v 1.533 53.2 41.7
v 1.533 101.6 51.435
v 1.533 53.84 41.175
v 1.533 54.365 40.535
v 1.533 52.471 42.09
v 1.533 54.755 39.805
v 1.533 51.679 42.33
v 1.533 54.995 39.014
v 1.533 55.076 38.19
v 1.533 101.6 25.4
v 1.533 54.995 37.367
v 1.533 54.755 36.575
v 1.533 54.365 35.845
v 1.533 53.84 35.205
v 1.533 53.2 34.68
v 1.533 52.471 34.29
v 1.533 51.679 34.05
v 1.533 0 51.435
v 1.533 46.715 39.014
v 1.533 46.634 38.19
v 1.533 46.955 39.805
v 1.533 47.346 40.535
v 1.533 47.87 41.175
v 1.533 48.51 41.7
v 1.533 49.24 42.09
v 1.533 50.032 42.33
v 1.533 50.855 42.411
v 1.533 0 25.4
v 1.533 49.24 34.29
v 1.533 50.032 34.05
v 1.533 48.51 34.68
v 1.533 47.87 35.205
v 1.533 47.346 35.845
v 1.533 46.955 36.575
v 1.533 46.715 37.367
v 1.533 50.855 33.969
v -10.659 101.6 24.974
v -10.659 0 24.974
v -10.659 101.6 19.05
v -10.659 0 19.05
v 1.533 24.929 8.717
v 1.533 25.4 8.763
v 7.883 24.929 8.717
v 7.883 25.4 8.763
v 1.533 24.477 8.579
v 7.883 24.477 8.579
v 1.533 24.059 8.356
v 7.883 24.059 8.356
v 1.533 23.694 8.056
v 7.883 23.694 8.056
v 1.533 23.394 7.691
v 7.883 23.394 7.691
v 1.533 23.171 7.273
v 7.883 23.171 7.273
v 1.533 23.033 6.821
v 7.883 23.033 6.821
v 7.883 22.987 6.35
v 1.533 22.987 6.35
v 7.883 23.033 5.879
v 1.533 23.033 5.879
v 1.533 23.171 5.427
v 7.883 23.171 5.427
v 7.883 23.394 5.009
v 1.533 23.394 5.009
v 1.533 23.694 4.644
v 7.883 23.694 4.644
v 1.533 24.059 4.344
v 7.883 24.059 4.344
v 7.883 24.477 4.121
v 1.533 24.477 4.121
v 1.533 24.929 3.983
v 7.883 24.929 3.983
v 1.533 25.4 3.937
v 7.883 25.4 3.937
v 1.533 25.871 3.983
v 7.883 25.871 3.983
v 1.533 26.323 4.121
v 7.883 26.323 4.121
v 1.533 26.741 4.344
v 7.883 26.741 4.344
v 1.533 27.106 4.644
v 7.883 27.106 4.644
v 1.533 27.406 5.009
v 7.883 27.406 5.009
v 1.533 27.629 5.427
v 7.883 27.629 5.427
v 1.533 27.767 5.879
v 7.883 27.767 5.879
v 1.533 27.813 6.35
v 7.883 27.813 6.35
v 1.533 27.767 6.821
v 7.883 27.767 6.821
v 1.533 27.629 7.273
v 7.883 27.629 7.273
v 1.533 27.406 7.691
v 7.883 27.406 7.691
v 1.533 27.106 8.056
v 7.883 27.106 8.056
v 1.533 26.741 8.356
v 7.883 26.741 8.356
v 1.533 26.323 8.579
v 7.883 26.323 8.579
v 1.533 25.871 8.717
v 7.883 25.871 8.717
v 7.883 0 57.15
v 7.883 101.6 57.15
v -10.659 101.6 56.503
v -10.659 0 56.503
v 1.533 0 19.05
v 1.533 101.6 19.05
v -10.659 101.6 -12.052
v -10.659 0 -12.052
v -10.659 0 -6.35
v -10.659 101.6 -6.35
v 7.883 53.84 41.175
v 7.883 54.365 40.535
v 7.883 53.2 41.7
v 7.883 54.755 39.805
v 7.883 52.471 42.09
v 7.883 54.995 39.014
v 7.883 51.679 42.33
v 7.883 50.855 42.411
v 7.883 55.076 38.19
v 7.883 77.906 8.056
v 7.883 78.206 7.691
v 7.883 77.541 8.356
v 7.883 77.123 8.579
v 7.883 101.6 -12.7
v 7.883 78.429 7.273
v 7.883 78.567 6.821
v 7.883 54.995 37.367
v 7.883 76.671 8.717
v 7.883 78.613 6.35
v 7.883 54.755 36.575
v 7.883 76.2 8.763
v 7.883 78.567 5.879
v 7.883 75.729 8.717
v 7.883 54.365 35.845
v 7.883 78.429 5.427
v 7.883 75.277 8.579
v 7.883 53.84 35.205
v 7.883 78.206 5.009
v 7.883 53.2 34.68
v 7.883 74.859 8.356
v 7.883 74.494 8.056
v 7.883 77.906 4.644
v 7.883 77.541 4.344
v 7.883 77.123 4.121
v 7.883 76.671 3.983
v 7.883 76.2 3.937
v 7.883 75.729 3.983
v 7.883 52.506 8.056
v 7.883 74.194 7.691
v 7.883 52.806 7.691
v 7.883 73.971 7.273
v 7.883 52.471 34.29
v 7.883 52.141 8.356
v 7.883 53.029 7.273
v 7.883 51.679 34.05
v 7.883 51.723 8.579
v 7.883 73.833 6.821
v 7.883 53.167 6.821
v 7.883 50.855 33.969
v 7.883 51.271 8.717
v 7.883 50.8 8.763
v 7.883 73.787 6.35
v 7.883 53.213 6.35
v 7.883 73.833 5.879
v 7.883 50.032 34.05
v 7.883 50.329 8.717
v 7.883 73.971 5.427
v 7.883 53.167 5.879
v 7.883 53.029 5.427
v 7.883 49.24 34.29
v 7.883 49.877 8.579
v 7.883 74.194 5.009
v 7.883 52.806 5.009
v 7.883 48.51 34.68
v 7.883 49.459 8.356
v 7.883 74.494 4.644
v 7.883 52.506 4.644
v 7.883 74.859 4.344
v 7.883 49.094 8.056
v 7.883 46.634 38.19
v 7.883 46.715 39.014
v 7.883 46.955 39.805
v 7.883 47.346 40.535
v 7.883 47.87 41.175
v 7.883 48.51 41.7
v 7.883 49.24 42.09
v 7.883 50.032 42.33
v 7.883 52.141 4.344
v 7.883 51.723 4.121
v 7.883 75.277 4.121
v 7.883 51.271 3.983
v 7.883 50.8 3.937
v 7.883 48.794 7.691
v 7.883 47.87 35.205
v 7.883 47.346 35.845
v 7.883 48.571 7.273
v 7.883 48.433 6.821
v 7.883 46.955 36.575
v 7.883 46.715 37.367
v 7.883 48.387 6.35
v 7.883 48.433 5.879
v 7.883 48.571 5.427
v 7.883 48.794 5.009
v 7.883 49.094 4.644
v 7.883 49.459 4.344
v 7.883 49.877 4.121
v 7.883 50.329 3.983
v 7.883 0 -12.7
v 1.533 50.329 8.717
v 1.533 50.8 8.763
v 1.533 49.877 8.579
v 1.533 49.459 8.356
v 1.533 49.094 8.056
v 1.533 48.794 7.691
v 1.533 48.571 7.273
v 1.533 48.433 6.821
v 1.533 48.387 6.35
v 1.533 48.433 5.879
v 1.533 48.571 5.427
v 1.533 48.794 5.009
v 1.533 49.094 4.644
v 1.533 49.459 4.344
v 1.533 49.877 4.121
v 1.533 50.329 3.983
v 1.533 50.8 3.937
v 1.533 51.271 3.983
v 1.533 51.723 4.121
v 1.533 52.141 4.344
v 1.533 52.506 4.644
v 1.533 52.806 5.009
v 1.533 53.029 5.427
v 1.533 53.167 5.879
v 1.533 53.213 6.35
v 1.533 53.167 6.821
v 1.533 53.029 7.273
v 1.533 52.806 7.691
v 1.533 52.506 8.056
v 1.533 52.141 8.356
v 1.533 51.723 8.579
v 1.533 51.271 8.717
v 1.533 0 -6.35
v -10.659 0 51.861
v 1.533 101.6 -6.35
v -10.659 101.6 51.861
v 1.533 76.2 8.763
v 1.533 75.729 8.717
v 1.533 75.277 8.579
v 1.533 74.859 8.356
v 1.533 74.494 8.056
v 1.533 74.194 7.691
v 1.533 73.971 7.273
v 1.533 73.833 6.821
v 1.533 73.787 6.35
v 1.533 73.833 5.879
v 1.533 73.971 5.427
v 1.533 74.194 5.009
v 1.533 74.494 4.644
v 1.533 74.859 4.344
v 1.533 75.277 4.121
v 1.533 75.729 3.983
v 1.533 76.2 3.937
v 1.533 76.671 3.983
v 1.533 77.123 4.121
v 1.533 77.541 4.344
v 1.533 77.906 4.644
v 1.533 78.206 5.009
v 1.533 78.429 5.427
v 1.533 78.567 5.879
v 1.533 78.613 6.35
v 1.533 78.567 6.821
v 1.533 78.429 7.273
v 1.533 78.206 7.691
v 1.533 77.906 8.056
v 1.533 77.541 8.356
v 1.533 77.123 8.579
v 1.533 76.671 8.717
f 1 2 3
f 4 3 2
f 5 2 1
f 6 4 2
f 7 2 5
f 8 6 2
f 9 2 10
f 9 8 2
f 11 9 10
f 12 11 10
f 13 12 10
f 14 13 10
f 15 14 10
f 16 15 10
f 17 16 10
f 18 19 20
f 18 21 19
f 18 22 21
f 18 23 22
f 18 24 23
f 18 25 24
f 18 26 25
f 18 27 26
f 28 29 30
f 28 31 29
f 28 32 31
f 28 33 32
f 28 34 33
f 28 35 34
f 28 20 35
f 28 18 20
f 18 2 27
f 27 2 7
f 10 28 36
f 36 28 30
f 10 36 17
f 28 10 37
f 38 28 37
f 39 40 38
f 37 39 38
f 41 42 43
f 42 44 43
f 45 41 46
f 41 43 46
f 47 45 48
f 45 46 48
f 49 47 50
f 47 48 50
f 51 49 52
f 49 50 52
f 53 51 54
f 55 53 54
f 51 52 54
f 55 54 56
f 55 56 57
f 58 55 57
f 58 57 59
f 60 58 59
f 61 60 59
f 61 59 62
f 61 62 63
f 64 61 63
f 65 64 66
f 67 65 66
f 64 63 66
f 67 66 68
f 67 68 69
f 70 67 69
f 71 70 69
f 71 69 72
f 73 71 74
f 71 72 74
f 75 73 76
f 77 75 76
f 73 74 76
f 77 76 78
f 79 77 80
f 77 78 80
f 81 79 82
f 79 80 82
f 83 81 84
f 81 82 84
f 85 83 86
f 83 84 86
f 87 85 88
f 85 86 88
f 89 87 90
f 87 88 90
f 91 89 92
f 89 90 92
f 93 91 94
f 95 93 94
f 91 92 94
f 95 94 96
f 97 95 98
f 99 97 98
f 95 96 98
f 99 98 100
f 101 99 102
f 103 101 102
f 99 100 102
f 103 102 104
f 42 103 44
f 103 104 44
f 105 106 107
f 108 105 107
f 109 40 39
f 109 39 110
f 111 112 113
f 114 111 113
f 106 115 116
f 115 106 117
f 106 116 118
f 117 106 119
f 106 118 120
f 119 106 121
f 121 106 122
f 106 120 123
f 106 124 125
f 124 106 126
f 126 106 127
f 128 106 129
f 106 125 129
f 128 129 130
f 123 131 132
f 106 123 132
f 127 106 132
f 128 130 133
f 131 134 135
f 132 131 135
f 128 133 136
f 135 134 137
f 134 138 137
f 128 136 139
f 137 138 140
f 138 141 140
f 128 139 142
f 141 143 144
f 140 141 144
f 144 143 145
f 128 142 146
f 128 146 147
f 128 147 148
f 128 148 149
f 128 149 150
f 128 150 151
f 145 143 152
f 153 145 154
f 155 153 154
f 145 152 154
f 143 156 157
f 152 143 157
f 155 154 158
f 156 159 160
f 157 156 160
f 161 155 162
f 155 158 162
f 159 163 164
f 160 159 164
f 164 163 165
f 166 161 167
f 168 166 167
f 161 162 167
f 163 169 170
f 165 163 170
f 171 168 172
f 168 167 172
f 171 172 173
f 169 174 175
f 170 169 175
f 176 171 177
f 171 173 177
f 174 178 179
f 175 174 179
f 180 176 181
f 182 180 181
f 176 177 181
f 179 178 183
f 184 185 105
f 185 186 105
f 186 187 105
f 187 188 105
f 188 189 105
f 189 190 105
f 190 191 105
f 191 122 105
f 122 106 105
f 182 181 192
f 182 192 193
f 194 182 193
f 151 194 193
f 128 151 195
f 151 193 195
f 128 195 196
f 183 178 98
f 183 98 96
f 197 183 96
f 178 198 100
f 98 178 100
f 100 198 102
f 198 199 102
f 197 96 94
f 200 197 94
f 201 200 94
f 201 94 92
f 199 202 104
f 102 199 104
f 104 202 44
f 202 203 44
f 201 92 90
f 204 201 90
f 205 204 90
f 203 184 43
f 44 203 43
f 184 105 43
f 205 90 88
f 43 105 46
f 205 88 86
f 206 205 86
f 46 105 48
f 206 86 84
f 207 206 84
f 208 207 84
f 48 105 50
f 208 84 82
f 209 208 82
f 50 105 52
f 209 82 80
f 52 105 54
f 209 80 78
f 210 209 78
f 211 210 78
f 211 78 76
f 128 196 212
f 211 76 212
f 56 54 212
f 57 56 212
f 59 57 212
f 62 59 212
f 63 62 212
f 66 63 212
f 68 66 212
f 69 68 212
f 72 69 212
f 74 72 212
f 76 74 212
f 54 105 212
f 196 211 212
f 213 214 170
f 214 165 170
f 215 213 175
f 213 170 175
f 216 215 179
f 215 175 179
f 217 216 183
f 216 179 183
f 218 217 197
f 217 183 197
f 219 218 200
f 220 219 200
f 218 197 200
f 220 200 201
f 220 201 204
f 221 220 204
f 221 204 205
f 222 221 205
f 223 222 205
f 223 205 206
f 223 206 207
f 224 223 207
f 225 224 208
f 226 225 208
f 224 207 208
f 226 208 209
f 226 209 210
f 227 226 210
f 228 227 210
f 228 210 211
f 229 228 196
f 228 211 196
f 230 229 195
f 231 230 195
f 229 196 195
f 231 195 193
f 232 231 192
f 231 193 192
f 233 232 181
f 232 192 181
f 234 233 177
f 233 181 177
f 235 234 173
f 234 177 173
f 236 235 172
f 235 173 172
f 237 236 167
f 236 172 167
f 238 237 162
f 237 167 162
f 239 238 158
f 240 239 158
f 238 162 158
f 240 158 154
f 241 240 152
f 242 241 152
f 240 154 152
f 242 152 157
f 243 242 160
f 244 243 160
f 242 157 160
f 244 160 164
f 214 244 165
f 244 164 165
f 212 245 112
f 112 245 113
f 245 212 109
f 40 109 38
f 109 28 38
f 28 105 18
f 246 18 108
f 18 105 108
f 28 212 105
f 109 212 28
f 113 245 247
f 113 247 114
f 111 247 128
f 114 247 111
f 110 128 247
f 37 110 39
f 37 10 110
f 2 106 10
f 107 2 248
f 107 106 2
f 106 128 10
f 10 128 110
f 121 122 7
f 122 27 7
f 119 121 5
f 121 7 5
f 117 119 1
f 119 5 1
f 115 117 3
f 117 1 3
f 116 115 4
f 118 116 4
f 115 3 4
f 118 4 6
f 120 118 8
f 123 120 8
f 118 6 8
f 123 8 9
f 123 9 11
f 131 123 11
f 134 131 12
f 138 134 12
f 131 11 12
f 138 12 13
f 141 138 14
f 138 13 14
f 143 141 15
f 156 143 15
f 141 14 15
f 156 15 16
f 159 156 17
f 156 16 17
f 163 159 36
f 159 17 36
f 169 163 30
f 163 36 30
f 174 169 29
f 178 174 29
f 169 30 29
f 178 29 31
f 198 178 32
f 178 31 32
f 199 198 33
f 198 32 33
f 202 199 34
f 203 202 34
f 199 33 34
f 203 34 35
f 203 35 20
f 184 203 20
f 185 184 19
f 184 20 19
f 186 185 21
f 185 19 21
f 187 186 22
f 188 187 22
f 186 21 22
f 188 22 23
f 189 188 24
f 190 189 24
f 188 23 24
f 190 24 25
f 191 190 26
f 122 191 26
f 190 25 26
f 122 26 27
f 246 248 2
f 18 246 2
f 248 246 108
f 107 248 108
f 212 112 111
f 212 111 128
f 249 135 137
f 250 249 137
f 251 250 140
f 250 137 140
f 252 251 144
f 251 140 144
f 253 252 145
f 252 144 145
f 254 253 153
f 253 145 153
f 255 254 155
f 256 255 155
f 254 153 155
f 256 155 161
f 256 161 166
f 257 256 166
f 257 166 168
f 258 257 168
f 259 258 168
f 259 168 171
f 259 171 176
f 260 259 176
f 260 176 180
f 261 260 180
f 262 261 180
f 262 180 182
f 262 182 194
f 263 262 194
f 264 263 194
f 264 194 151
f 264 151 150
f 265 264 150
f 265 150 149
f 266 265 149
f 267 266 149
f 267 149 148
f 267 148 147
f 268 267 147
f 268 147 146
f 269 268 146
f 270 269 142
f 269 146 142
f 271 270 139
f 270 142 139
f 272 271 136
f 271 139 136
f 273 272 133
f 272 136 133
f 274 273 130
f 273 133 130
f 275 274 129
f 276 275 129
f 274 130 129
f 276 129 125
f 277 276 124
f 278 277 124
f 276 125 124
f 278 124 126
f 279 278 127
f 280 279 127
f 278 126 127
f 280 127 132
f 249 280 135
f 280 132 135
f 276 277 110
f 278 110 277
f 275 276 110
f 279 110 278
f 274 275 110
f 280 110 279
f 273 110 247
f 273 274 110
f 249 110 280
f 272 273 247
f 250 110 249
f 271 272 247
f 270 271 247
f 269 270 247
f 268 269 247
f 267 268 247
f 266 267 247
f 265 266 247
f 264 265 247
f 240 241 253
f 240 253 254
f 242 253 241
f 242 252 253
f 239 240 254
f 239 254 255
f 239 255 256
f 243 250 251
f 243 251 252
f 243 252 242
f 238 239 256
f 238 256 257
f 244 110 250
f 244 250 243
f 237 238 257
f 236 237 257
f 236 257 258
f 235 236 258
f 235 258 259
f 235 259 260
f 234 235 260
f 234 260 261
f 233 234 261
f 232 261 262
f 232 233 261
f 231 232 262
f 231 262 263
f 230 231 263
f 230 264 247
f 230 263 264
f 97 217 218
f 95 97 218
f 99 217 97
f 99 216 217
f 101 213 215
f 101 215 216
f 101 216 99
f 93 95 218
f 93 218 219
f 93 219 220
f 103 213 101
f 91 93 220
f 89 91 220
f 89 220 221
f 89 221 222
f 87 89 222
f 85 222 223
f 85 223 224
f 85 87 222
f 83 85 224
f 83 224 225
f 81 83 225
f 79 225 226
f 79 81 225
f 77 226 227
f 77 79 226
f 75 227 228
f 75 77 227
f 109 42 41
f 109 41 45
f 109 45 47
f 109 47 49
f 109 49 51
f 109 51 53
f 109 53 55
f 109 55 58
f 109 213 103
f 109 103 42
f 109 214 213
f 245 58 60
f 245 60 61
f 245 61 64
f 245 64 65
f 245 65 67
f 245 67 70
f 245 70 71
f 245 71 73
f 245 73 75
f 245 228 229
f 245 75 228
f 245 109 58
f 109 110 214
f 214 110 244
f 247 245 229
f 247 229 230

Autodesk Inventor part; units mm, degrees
ref_plane "YZ Plane" through (0, 0, 0) normal (1, 0, 0) x (0, 1, 0)
ref_plane "XZ Plane" through (0, 0, 0) normal (0, 1, 0) x (-1, 0, 0)
ref_plane "XY Plane" through (0, 0, 0) normal (0, 0, 1) x (1, 0, 0)
sketch "Sketch1" plane through (0, 0, 0) normal (0, 1, 0) x (-1, 0, 0)
  line L0 (10.6592, 57.15) -> (-7.8828, 57.15)
  line L1 (-7.8828, 57.15) -> (-7.8828, -12.7)
  line L2 (-7.8828, -12.7) -> (10.6592, -12.7)
  line L3 (10.6592, 51.435) -> (-1.5328, 51.435)
  line L4 (-1.5328, 51.435) -> (-1.5328, 25.4)
  line L5 (-1.5328, 25.4) -> (10.6592, 25.4)
  line L6 (10.6592, 19.05) -> (-1.5328, 19.05)
  line L7 (-1.5328, 19.05) -> (-1.5328, -6.35)
  line L8 (-1.5328, -6.35) -> (10.6592, -6.35)
  line L9 (10.6592, -12.7) -> (10.6592, -6.35)
  line L10 (10.6592, 19.05) -> (10.6592, 25.4)
  line L11 (10.6592, 51.435) -> (10.6592, 57.15)
  point P0 (0, 0)
  dimension "d0" = 18.542
  dimension "d3" = 6.35
  dimension "d4" = 6.35
  dimension "d5" = 5.715
  dimension "d7" = 0
  dimension "d8" = 26.035
  dimension "d9" = 25.4
  dimension "d25" = 0
  dimension "d26" = 0
extrude "Extrusion1" add sketch "Sketch1" along normal blind 101.6
sketch "Sketch2" plane through (1.5328, 0, -6.35) normal (-1, 0, 0) x (0, 0, 1)
  line L0 (0, 0) -> (0, 101.6) projected
  line L1 (0, 0) -> (25.4, 0) projected
  point P0 (6.35, 0)
  point P1 (12.7, 25.4)
  point P2 (12.7, 50.8)
  point P3 (12.7, 76.2)
  dimension "d12" = 12.7
  dimension "d13" = 25.4
  dimension "d14" = 25.4
  dimension "d15" = 0
  dimension "d16" = 0
  dimension "d17" = 25.4
hole "Hole1" at (1.5328, 25.4, 6.35) at (1.5328, 50.8, 6.35) at (1.5328, 76.2, 6.35) direction (1, 0, 0) diameter 4.826 depth 25.4 tip angle 118
sketch "Sketch3" plane through (0, 101.6, 0) normal (0, 1, 0) x (1, 0, 0)
  line L0 (1.5328, -25.4) -> (-10.7917, -24.9696)
  line L1 (-10.7917, -24.9696) -> (-10.7917, -25.4)
  line L2 (-10.6592, -25.4) -> (1.5328, -25.4) projected
  line L3 (-10.7917, -25.4) -> (1.5328, -25.4)
  point P0 (0, 0)
  dimension "d27" = 2
extrude "Extrusion2" cut sketch "Sketch3" against normal blind 111.125
sketch "Sketch4" plane through (0, 101.6, 0) normal (0, 1, 0) x (1, 0, 0)
  line L0 (1.5328, -51.435) -> (-12.9577, -51.435)
  line L1 (-12.9577, -51.435) -> (-12.9577, -51.941)
  line L2 (-12.9577, -51.941) -> (1.5328, -51.435)
  point P0 (0, 0)
  dimension "d30" = 2
extrude "Extrusion3" cut sketch "Sketch4" against normal blind 119.0625
sketch "Sketch5" plane through (0, 101.6, 0) normal (0, 1, 0) x (1, 0, 0)
  line L0 (-10.6592, -57.15) -> (7.8828, -57.15) projected
  line L1 (7.8828, -57.15) -> (-13.0423, -56.4193)
  line L2 (-13.0423, -56.4193) -> (-13.0009, -57.15)
  line L3 (-13.0009, -57.15) -> (7.8828, -57.15)
  point P0 (0, 0)
  dimension "d33" = 2
extrude "Extrusion4" cut sketch "Sketch5" against normal blind 196.85
sketch "Sketch6" plane through (0, 101.6, 0) normal (0, 1, 0) x (1, 0, 0)
  line L0 (7.8828, 12.7) -> (-10.6592, 12.7) projected
  line L1 (7.8828, 12.7) -> (-16.8119, 12.7)
  line L2 (-16.8119, 12.7) -> (-16.8119, 11.8376)
  line L3 (7.8828, -57.15) -> (7.8828, 12.7) projected
  line L4 (-16.8119, 11.8376) -> (7.8828, 12.7)
  point P0 (0, 0)
  dimension "d36" = 2
extrude "Extrusion5" cut sketch "Sketch6" against normal blind 334.9625
sketch "Sketch7" plane through (1.5328, 0, 25.4) normal (-1, 0, 0) x (0, 0, 1)
  circle A0 centre (12.7901, 50.8553) radius 4.2212
  point P0 (-25.4, 0)
extrude "Extrusion6" cut sketch "Sketch7" against normal blind 58.7375
equation "\"d0\" = ElvDelWidth"
equation "\"d3\" = ElvDelFrontTabLength"
equation "\"d4\" = ElvDelMiddleTabLength"
equation "\"d9\" = ElvBeamWidth"
equation "\"d10\" = ElvDelHeight"
equation "\"ElvBeamWidth\" = 25.4"
equation "\"ElvDelWidth\" = 18.542"
equation "\"ElvDelHeight\" = 101.6"
equation "\"ElvDelFrontTabLength\" = 6.35"
equation "\"ElvDelDepth\" = 6.35"
equation "\"d2\" = ElvDelDepth"
equation "\"ElvCrossBeamLength\" = 304.8"
equation "\"ElvFixedBeamLength\" = 990.6"
equation "\"ElvMiddleBeamLength\" = 990.6"
equation "\"ElvFrontBeamLength\" = 990.6"
equation "\"ElvEndEffectLength\" = 431.8"
equation "\"ElvWallWidth\" = 1.5875"
equation "\"ElvTopBeamLength\" = 457.2"
equation "\"ElvHoleFromFront\" = 25.4"
equation "\"ElvHoleFromMid\" = 38.1"
equation "\"ElvHoleFromFixed\" = 50.8"
equation "\"ElvHoleFromBottom\" = 38.1"
equation "\"ElvRivetPlateLength\" = 76.2"
equation "\"ElvDelMiddleTabLength\" = 6.35"
properties part number "ElvDelV3" material "Acetal Resin, White"
